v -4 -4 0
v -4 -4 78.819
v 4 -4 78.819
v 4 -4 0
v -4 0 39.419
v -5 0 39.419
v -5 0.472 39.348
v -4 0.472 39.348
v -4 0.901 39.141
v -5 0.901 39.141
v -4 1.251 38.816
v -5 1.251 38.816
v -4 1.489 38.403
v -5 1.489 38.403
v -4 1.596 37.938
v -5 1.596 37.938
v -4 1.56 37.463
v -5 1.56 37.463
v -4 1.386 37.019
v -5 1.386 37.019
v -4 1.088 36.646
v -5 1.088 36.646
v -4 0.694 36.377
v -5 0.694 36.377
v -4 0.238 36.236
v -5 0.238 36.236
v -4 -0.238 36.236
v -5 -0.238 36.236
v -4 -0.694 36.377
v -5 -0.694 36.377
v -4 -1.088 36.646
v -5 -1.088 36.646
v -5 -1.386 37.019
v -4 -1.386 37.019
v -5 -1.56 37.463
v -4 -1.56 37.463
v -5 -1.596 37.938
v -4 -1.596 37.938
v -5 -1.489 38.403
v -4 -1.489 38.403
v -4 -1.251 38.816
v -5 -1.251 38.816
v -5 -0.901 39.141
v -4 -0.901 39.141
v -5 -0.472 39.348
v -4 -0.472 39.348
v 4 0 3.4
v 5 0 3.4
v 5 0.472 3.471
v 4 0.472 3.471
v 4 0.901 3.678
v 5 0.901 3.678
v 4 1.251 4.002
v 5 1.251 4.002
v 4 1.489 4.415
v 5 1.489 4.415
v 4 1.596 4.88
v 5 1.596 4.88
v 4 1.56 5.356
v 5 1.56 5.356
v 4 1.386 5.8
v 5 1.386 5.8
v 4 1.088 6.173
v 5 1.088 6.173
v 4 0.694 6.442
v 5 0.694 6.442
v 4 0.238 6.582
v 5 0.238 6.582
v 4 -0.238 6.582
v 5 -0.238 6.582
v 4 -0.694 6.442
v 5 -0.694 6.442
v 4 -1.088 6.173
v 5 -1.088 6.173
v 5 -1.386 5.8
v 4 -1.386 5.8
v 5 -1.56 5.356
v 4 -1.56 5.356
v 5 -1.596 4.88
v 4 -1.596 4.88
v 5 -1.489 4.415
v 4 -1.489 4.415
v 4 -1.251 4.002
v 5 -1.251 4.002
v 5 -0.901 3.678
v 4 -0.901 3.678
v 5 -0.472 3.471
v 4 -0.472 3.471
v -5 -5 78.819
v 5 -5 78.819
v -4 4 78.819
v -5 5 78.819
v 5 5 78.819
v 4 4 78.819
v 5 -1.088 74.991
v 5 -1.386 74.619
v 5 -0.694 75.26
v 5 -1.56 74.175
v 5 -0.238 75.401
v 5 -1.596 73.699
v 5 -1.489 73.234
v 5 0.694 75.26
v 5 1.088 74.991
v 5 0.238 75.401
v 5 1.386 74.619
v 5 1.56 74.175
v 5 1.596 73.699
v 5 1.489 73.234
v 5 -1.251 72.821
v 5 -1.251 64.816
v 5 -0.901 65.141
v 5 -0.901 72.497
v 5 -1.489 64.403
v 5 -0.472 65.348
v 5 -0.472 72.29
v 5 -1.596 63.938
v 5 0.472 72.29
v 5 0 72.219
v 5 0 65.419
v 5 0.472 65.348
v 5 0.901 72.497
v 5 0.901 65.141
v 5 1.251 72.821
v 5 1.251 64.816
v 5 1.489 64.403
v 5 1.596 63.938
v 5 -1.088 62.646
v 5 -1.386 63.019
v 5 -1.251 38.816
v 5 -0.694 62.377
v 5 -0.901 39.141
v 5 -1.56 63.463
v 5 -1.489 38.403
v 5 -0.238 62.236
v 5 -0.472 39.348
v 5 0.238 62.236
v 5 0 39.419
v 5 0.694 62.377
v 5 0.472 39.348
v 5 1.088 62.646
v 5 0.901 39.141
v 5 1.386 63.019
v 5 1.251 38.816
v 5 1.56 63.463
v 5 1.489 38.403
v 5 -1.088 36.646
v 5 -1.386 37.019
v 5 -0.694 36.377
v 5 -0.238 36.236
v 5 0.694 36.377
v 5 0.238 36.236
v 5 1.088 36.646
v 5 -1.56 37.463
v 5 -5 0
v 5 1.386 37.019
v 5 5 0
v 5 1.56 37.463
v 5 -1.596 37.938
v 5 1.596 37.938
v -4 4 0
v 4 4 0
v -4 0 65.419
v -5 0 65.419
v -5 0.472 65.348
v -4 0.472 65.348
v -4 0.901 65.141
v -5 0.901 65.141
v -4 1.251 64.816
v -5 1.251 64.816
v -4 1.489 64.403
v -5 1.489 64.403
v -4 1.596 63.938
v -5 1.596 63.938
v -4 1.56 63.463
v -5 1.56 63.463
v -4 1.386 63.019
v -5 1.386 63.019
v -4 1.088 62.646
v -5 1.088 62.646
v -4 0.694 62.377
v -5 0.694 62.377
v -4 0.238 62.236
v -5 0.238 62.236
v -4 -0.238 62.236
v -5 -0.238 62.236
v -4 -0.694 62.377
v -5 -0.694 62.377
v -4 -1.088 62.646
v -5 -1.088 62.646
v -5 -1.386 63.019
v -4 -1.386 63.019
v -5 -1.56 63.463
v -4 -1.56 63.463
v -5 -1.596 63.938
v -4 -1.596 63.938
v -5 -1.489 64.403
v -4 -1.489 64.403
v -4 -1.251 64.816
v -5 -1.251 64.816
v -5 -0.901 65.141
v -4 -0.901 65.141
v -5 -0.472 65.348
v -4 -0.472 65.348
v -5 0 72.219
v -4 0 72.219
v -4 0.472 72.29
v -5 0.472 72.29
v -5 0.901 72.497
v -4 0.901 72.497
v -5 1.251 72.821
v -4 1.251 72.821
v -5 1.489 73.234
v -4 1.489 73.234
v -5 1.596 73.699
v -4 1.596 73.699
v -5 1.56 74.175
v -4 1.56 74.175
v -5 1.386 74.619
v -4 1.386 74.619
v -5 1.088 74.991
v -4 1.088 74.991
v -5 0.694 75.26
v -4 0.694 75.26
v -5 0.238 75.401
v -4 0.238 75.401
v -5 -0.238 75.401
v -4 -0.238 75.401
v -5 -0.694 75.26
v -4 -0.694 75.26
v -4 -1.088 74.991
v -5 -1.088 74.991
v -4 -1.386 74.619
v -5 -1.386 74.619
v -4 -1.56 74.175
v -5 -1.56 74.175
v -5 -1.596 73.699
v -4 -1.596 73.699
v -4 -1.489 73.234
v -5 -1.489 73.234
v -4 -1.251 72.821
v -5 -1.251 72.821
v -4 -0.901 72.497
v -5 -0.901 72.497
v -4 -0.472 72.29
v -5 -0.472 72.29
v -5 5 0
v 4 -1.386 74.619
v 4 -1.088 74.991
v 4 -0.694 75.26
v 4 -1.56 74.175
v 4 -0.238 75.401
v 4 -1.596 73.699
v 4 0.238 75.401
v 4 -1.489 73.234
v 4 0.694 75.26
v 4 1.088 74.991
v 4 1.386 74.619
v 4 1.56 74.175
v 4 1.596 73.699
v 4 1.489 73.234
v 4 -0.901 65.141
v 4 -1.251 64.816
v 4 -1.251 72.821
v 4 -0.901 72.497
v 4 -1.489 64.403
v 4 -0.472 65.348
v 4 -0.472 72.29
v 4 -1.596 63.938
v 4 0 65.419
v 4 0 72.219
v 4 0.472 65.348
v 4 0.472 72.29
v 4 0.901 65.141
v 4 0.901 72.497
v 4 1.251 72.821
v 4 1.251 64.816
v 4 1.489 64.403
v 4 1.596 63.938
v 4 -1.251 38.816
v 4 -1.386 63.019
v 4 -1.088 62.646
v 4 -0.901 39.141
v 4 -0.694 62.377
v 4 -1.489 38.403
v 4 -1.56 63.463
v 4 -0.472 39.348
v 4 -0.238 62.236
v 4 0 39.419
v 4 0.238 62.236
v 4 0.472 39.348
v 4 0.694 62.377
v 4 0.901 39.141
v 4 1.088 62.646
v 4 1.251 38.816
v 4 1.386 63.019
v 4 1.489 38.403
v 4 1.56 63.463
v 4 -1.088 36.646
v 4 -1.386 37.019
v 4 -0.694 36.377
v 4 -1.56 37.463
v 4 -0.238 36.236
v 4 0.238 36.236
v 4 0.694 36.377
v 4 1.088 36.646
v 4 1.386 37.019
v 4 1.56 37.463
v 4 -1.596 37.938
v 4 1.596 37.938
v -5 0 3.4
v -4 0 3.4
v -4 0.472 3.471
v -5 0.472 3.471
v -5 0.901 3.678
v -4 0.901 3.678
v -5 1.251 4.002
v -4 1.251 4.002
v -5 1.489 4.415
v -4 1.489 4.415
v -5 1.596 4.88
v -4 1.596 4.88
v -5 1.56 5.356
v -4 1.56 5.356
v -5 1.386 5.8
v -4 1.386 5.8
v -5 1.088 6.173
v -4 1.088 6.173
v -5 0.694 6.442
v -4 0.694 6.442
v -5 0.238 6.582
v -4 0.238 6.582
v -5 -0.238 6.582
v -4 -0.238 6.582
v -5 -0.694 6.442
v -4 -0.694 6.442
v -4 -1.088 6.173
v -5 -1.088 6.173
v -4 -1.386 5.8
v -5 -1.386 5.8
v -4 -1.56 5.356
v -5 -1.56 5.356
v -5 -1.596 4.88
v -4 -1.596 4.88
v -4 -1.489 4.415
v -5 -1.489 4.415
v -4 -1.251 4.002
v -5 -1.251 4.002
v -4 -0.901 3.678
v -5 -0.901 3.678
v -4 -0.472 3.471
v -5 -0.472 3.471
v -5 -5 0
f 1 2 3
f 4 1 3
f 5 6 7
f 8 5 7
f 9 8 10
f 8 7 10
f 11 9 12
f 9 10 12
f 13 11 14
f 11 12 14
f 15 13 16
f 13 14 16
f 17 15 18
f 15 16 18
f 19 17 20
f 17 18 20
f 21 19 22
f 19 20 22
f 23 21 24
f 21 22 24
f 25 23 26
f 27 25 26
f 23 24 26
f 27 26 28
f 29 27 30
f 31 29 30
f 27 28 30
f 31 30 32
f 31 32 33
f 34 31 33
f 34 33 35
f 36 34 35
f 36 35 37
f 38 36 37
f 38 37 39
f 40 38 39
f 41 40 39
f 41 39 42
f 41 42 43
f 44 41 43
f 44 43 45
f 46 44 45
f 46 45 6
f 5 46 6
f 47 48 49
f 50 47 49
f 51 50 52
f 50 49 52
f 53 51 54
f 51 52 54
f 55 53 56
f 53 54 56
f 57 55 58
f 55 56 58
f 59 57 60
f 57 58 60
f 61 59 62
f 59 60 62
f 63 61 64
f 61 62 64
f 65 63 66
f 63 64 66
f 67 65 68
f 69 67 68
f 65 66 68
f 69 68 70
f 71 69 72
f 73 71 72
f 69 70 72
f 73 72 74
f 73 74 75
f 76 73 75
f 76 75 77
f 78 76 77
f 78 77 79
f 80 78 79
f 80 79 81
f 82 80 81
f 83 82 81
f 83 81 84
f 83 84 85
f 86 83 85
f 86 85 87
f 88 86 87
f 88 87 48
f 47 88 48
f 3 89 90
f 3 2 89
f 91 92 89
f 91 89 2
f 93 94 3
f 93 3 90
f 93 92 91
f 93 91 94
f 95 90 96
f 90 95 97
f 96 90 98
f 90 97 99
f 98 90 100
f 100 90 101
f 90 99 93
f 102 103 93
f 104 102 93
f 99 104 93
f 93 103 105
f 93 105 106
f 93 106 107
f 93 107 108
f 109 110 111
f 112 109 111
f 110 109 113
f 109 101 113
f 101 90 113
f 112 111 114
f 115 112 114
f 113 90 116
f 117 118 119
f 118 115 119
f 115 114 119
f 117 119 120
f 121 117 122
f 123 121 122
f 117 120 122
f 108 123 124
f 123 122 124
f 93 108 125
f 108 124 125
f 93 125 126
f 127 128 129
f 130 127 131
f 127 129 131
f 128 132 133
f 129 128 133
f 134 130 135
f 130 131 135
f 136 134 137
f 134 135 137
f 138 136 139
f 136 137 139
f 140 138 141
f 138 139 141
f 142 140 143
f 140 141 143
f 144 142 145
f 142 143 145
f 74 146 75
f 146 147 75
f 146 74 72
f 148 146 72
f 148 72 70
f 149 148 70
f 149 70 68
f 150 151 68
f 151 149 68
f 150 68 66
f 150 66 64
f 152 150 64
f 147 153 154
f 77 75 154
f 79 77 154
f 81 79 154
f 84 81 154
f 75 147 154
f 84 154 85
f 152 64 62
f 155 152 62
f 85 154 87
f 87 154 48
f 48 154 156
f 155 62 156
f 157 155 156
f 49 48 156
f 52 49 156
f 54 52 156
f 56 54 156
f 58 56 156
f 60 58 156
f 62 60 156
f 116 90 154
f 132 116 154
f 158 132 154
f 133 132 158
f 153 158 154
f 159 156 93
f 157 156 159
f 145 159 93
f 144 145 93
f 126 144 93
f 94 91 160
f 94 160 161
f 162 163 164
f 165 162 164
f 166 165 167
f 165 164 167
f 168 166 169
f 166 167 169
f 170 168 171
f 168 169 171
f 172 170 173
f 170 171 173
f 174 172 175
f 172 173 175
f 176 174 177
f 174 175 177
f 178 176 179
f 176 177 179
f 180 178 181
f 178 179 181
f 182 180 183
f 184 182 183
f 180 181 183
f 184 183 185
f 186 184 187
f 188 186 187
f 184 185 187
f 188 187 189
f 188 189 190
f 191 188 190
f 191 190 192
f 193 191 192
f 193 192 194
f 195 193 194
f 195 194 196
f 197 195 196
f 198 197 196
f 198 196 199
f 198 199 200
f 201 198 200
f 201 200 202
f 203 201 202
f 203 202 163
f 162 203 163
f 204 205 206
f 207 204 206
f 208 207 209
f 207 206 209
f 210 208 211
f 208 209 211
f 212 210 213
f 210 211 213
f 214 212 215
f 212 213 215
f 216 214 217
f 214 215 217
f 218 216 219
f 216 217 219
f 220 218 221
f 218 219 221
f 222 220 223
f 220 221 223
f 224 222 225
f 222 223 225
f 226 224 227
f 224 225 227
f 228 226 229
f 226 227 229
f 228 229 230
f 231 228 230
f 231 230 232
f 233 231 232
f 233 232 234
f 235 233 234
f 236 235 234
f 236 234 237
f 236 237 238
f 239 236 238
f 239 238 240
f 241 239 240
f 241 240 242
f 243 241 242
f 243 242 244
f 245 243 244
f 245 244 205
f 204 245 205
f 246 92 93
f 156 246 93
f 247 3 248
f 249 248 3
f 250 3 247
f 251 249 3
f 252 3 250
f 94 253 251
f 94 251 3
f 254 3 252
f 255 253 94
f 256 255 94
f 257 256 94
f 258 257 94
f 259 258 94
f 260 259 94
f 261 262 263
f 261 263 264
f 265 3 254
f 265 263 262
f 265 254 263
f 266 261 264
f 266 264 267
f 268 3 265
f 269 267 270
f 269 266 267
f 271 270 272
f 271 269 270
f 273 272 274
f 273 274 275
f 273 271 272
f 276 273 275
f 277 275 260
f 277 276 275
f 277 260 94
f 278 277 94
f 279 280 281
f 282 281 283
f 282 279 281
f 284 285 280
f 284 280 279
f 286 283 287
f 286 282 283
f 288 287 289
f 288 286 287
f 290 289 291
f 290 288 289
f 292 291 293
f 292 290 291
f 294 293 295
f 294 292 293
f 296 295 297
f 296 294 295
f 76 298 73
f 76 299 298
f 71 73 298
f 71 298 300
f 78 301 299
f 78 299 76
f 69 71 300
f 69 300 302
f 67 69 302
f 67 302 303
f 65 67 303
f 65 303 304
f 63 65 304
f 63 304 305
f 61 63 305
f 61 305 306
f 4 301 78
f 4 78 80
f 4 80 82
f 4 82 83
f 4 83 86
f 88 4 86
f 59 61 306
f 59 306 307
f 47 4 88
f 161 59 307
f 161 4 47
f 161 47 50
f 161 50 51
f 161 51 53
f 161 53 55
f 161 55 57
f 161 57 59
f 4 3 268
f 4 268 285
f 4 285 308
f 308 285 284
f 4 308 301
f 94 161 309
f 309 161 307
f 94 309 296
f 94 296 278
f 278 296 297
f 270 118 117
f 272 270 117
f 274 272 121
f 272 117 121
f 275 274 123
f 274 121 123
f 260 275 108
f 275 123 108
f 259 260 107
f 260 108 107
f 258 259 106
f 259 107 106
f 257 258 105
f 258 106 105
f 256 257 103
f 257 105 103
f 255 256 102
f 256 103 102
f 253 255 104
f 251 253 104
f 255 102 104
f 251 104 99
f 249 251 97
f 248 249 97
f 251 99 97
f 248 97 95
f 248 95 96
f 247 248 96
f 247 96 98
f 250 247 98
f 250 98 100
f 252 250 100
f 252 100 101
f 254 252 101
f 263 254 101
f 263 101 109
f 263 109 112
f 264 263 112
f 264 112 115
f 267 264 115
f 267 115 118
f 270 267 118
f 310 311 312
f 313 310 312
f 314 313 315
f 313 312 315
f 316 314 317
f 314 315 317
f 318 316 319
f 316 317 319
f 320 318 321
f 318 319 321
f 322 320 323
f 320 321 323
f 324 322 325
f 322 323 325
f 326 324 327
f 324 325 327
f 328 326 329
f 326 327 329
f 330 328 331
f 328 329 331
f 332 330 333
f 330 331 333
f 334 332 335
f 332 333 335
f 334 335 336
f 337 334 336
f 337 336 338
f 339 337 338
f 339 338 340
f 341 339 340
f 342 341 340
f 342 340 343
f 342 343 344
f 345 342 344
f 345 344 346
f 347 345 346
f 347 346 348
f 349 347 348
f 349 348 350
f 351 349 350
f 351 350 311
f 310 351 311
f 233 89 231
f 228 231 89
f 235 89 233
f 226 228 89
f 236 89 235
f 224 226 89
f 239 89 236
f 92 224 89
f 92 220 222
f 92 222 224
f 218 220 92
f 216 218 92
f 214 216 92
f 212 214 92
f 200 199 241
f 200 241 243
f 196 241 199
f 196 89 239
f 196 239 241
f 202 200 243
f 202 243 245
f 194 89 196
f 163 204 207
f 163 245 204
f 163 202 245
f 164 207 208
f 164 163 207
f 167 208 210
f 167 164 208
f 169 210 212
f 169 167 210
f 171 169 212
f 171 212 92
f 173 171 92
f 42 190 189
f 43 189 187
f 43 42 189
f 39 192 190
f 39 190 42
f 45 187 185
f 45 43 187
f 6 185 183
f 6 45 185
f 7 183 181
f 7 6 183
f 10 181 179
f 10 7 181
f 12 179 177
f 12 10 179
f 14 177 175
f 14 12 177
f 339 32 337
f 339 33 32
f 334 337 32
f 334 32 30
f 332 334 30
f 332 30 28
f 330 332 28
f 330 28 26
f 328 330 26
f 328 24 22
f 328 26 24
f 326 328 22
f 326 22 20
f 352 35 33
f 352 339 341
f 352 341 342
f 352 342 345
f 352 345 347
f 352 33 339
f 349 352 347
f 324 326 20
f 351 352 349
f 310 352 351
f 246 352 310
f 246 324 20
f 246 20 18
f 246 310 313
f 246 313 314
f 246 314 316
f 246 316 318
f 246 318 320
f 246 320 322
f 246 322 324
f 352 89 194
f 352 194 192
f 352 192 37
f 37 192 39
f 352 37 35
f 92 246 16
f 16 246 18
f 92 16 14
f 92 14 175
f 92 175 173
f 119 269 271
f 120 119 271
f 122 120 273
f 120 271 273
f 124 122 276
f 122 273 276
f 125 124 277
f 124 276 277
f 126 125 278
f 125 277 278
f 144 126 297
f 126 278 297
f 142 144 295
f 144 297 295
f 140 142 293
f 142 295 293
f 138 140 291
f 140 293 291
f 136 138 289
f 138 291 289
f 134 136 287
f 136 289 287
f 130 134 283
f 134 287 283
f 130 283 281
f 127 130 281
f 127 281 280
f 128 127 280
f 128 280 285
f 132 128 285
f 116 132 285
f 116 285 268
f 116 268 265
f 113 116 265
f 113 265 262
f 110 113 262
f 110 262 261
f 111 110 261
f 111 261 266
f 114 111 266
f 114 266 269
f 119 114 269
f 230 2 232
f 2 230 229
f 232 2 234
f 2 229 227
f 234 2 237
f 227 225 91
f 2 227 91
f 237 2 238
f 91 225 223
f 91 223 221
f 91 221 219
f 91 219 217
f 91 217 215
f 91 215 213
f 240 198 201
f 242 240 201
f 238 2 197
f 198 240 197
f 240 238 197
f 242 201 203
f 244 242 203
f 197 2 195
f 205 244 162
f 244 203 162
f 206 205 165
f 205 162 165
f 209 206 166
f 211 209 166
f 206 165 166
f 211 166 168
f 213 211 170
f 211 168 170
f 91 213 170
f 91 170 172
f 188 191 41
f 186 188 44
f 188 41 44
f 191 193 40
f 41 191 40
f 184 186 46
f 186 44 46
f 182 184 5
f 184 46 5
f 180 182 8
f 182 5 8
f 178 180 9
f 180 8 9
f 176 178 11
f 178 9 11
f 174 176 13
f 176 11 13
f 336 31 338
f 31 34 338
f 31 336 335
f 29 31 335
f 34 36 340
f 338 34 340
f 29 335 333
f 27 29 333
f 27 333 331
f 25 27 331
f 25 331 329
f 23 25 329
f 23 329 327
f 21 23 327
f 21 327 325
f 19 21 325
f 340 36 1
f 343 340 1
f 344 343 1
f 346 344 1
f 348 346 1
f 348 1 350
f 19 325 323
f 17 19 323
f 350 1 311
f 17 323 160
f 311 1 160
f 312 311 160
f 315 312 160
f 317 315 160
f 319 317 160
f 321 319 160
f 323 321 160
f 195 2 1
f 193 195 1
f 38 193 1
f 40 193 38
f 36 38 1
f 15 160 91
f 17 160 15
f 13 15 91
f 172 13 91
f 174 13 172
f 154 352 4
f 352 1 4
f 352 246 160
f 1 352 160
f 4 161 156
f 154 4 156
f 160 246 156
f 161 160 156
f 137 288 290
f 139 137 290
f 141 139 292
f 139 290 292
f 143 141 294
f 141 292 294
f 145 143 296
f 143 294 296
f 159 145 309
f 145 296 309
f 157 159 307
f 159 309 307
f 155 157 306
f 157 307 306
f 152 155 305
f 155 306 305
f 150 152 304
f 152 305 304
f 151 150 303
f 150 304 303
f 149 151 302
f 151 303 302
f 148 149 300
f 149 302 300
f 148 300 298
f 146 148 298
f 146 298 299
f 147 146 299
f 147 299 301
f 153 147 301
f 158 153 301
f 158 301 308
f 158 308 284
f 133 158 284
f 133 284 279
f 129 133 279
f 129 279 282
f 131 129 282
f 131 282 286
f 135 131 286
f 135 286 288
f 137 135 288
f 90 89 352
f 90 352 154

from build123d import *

# Parameters (mm, degrees)
SKETCH_1_W          = 10
SKETCH_1_H          = 10
SKETCH_1_W_2        = 8
SKETCH_1_H_2        = 8
EXTRUDE_1_DEPTH     = 78.81860214
SKETCH_2_R          = 1.6
CUT_EXTRUDE_1_DEPTH = 80.607612973
SKETCH_3_R          = 1.6
CUT_EXTRUDE_3_DEPTH = 80.607612973


with BuildPart() as part:
    # ｽｹｯﾁ1 → ﾎﾞｽ - 押し出し1 (new body)
    with BuildSketch(Plane.XY):
        Rectangle(SKETCH_1_W, SKETCH_1_H)
        Rectangle(SKETCH_1_W_2, SKETCH_1_H_2, mode=Mode.SUBTRACT)
    extrude(amount=EXTRUDE_1_DEPTH)

    # ｽｹｯﾁ2 → ｶｯﾄ - 押し出し1 (cut, through all)
    with BuildSketch(Plane(origin=(5, 0, 0), x_dir=(0, 0, -1), z_dir=(1, 0, 0))):
        with Locations((-5, 0)):
            Circle(SKETCH_2_R)
        with Locations((-73.81860214, 0)):
            Circle(SKETCH_2_R)
    extrude(amount=-CUT_EXTRUDE_1_DEPTH, mode=Mode.SUBTRACT)

    # ｽｹｯﾁ3 → ｶｯﾄ - 押し出し3 (cut, through all)
    with BuildSketch(Plane.ZY.offset(5)):
        with Locations((63.81860214, 0)):
            Circle(SKETCH_3_R)
        with Locations((37.81860214, 0)):
            Circle(SKETCH_3_R)
    extrude(amount=-CUT_EXTRUDE_3_DEPTH, mode=Mode.SUBTRACT)


solid = part.part
